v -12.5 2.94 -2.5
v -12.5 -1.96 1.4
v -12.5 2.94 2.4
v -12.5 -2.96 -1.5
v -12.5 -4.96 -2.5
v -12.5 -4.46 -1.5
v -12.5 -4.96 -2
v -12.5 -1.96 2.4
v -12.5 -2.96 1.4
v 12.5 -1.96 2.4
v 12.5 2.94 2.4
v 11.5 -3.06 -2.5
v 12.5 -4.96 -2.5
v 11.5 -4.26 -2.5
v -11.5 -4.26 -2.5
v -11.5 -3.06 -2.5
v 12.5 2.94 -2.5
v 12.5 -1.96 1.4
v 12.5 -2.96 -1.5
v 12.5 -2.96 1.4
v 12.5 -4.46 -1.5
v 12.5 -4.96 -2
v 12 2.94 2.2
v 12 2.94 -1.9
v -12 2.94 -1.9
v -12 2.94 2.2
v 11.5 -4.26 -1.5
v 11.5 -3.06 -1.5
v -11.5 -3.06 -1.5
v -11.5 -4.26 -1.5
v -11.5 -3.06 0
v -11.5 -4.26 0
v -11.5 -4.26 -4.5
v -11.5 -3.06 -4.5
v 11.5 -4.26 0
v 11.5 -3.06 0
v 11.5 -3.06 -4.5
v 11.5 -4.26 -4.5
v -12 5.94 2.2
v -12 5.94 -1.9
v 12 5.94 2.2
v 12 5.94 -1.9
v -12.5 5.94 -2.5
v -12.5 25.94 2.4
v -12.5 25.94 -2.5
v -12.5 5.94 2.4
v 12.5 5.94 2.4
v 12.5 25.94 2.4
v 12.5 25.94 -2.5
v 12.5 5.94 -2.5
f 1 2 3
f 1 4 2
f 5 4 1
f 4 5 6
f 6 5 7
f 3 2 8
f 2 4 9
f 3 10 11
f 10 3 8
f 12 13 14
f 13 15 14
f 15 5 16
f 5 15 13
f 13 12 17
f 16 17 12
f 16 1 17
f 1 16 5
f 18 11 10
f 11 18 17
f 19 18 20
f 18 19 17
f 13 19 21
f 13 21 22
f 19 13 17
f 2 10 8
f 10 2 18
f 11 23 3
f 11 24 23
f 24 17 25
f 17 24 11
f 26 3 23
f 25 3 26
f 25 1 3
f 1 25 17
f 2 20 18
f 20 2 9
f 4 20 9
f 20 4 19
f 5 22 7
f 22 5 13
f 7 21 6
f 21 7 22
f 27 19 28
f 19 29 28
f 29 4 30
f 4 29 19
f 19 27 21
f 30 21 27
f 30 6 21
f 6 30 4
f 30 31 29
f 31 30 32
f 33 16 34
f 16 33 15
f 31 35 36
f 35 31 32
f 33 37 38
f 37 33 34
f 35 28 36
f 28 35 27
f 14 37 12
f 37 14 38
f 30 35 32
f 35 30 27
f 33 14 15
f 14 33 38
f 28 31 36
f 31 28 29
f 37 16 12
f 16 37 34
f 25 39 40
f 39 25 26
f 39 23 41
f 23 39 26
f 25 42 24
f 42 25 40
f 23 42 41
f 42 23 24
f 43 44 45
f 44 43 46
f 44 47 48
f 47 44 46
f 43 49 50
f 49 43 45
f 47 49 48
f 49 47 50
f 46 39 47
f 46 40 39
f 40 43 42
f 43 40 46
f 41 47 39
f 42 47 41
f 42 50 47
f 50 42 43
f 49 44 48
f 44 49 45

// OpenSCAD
N=9;
A=2.5+N*2.5;
rotate([0,0,180])
translate([-A/2,-2.94,-2.5])
{
	cube([A,4.9,4.9]);
	cube([A,5.9,3.9]);
	hull()
	{
		cube([A,7.4,1]);
		cube([A,7.9,0.5]);
	}
	translate([1,6,-2])cube([A-2,1.2,4.5]); // Assumes cropped pins
	// Plug
	translate([0.5,-20,0.6])cube([A-1,21,4.1]);
	translate([0,-23,0])cube([A,20,4.9]);
}
